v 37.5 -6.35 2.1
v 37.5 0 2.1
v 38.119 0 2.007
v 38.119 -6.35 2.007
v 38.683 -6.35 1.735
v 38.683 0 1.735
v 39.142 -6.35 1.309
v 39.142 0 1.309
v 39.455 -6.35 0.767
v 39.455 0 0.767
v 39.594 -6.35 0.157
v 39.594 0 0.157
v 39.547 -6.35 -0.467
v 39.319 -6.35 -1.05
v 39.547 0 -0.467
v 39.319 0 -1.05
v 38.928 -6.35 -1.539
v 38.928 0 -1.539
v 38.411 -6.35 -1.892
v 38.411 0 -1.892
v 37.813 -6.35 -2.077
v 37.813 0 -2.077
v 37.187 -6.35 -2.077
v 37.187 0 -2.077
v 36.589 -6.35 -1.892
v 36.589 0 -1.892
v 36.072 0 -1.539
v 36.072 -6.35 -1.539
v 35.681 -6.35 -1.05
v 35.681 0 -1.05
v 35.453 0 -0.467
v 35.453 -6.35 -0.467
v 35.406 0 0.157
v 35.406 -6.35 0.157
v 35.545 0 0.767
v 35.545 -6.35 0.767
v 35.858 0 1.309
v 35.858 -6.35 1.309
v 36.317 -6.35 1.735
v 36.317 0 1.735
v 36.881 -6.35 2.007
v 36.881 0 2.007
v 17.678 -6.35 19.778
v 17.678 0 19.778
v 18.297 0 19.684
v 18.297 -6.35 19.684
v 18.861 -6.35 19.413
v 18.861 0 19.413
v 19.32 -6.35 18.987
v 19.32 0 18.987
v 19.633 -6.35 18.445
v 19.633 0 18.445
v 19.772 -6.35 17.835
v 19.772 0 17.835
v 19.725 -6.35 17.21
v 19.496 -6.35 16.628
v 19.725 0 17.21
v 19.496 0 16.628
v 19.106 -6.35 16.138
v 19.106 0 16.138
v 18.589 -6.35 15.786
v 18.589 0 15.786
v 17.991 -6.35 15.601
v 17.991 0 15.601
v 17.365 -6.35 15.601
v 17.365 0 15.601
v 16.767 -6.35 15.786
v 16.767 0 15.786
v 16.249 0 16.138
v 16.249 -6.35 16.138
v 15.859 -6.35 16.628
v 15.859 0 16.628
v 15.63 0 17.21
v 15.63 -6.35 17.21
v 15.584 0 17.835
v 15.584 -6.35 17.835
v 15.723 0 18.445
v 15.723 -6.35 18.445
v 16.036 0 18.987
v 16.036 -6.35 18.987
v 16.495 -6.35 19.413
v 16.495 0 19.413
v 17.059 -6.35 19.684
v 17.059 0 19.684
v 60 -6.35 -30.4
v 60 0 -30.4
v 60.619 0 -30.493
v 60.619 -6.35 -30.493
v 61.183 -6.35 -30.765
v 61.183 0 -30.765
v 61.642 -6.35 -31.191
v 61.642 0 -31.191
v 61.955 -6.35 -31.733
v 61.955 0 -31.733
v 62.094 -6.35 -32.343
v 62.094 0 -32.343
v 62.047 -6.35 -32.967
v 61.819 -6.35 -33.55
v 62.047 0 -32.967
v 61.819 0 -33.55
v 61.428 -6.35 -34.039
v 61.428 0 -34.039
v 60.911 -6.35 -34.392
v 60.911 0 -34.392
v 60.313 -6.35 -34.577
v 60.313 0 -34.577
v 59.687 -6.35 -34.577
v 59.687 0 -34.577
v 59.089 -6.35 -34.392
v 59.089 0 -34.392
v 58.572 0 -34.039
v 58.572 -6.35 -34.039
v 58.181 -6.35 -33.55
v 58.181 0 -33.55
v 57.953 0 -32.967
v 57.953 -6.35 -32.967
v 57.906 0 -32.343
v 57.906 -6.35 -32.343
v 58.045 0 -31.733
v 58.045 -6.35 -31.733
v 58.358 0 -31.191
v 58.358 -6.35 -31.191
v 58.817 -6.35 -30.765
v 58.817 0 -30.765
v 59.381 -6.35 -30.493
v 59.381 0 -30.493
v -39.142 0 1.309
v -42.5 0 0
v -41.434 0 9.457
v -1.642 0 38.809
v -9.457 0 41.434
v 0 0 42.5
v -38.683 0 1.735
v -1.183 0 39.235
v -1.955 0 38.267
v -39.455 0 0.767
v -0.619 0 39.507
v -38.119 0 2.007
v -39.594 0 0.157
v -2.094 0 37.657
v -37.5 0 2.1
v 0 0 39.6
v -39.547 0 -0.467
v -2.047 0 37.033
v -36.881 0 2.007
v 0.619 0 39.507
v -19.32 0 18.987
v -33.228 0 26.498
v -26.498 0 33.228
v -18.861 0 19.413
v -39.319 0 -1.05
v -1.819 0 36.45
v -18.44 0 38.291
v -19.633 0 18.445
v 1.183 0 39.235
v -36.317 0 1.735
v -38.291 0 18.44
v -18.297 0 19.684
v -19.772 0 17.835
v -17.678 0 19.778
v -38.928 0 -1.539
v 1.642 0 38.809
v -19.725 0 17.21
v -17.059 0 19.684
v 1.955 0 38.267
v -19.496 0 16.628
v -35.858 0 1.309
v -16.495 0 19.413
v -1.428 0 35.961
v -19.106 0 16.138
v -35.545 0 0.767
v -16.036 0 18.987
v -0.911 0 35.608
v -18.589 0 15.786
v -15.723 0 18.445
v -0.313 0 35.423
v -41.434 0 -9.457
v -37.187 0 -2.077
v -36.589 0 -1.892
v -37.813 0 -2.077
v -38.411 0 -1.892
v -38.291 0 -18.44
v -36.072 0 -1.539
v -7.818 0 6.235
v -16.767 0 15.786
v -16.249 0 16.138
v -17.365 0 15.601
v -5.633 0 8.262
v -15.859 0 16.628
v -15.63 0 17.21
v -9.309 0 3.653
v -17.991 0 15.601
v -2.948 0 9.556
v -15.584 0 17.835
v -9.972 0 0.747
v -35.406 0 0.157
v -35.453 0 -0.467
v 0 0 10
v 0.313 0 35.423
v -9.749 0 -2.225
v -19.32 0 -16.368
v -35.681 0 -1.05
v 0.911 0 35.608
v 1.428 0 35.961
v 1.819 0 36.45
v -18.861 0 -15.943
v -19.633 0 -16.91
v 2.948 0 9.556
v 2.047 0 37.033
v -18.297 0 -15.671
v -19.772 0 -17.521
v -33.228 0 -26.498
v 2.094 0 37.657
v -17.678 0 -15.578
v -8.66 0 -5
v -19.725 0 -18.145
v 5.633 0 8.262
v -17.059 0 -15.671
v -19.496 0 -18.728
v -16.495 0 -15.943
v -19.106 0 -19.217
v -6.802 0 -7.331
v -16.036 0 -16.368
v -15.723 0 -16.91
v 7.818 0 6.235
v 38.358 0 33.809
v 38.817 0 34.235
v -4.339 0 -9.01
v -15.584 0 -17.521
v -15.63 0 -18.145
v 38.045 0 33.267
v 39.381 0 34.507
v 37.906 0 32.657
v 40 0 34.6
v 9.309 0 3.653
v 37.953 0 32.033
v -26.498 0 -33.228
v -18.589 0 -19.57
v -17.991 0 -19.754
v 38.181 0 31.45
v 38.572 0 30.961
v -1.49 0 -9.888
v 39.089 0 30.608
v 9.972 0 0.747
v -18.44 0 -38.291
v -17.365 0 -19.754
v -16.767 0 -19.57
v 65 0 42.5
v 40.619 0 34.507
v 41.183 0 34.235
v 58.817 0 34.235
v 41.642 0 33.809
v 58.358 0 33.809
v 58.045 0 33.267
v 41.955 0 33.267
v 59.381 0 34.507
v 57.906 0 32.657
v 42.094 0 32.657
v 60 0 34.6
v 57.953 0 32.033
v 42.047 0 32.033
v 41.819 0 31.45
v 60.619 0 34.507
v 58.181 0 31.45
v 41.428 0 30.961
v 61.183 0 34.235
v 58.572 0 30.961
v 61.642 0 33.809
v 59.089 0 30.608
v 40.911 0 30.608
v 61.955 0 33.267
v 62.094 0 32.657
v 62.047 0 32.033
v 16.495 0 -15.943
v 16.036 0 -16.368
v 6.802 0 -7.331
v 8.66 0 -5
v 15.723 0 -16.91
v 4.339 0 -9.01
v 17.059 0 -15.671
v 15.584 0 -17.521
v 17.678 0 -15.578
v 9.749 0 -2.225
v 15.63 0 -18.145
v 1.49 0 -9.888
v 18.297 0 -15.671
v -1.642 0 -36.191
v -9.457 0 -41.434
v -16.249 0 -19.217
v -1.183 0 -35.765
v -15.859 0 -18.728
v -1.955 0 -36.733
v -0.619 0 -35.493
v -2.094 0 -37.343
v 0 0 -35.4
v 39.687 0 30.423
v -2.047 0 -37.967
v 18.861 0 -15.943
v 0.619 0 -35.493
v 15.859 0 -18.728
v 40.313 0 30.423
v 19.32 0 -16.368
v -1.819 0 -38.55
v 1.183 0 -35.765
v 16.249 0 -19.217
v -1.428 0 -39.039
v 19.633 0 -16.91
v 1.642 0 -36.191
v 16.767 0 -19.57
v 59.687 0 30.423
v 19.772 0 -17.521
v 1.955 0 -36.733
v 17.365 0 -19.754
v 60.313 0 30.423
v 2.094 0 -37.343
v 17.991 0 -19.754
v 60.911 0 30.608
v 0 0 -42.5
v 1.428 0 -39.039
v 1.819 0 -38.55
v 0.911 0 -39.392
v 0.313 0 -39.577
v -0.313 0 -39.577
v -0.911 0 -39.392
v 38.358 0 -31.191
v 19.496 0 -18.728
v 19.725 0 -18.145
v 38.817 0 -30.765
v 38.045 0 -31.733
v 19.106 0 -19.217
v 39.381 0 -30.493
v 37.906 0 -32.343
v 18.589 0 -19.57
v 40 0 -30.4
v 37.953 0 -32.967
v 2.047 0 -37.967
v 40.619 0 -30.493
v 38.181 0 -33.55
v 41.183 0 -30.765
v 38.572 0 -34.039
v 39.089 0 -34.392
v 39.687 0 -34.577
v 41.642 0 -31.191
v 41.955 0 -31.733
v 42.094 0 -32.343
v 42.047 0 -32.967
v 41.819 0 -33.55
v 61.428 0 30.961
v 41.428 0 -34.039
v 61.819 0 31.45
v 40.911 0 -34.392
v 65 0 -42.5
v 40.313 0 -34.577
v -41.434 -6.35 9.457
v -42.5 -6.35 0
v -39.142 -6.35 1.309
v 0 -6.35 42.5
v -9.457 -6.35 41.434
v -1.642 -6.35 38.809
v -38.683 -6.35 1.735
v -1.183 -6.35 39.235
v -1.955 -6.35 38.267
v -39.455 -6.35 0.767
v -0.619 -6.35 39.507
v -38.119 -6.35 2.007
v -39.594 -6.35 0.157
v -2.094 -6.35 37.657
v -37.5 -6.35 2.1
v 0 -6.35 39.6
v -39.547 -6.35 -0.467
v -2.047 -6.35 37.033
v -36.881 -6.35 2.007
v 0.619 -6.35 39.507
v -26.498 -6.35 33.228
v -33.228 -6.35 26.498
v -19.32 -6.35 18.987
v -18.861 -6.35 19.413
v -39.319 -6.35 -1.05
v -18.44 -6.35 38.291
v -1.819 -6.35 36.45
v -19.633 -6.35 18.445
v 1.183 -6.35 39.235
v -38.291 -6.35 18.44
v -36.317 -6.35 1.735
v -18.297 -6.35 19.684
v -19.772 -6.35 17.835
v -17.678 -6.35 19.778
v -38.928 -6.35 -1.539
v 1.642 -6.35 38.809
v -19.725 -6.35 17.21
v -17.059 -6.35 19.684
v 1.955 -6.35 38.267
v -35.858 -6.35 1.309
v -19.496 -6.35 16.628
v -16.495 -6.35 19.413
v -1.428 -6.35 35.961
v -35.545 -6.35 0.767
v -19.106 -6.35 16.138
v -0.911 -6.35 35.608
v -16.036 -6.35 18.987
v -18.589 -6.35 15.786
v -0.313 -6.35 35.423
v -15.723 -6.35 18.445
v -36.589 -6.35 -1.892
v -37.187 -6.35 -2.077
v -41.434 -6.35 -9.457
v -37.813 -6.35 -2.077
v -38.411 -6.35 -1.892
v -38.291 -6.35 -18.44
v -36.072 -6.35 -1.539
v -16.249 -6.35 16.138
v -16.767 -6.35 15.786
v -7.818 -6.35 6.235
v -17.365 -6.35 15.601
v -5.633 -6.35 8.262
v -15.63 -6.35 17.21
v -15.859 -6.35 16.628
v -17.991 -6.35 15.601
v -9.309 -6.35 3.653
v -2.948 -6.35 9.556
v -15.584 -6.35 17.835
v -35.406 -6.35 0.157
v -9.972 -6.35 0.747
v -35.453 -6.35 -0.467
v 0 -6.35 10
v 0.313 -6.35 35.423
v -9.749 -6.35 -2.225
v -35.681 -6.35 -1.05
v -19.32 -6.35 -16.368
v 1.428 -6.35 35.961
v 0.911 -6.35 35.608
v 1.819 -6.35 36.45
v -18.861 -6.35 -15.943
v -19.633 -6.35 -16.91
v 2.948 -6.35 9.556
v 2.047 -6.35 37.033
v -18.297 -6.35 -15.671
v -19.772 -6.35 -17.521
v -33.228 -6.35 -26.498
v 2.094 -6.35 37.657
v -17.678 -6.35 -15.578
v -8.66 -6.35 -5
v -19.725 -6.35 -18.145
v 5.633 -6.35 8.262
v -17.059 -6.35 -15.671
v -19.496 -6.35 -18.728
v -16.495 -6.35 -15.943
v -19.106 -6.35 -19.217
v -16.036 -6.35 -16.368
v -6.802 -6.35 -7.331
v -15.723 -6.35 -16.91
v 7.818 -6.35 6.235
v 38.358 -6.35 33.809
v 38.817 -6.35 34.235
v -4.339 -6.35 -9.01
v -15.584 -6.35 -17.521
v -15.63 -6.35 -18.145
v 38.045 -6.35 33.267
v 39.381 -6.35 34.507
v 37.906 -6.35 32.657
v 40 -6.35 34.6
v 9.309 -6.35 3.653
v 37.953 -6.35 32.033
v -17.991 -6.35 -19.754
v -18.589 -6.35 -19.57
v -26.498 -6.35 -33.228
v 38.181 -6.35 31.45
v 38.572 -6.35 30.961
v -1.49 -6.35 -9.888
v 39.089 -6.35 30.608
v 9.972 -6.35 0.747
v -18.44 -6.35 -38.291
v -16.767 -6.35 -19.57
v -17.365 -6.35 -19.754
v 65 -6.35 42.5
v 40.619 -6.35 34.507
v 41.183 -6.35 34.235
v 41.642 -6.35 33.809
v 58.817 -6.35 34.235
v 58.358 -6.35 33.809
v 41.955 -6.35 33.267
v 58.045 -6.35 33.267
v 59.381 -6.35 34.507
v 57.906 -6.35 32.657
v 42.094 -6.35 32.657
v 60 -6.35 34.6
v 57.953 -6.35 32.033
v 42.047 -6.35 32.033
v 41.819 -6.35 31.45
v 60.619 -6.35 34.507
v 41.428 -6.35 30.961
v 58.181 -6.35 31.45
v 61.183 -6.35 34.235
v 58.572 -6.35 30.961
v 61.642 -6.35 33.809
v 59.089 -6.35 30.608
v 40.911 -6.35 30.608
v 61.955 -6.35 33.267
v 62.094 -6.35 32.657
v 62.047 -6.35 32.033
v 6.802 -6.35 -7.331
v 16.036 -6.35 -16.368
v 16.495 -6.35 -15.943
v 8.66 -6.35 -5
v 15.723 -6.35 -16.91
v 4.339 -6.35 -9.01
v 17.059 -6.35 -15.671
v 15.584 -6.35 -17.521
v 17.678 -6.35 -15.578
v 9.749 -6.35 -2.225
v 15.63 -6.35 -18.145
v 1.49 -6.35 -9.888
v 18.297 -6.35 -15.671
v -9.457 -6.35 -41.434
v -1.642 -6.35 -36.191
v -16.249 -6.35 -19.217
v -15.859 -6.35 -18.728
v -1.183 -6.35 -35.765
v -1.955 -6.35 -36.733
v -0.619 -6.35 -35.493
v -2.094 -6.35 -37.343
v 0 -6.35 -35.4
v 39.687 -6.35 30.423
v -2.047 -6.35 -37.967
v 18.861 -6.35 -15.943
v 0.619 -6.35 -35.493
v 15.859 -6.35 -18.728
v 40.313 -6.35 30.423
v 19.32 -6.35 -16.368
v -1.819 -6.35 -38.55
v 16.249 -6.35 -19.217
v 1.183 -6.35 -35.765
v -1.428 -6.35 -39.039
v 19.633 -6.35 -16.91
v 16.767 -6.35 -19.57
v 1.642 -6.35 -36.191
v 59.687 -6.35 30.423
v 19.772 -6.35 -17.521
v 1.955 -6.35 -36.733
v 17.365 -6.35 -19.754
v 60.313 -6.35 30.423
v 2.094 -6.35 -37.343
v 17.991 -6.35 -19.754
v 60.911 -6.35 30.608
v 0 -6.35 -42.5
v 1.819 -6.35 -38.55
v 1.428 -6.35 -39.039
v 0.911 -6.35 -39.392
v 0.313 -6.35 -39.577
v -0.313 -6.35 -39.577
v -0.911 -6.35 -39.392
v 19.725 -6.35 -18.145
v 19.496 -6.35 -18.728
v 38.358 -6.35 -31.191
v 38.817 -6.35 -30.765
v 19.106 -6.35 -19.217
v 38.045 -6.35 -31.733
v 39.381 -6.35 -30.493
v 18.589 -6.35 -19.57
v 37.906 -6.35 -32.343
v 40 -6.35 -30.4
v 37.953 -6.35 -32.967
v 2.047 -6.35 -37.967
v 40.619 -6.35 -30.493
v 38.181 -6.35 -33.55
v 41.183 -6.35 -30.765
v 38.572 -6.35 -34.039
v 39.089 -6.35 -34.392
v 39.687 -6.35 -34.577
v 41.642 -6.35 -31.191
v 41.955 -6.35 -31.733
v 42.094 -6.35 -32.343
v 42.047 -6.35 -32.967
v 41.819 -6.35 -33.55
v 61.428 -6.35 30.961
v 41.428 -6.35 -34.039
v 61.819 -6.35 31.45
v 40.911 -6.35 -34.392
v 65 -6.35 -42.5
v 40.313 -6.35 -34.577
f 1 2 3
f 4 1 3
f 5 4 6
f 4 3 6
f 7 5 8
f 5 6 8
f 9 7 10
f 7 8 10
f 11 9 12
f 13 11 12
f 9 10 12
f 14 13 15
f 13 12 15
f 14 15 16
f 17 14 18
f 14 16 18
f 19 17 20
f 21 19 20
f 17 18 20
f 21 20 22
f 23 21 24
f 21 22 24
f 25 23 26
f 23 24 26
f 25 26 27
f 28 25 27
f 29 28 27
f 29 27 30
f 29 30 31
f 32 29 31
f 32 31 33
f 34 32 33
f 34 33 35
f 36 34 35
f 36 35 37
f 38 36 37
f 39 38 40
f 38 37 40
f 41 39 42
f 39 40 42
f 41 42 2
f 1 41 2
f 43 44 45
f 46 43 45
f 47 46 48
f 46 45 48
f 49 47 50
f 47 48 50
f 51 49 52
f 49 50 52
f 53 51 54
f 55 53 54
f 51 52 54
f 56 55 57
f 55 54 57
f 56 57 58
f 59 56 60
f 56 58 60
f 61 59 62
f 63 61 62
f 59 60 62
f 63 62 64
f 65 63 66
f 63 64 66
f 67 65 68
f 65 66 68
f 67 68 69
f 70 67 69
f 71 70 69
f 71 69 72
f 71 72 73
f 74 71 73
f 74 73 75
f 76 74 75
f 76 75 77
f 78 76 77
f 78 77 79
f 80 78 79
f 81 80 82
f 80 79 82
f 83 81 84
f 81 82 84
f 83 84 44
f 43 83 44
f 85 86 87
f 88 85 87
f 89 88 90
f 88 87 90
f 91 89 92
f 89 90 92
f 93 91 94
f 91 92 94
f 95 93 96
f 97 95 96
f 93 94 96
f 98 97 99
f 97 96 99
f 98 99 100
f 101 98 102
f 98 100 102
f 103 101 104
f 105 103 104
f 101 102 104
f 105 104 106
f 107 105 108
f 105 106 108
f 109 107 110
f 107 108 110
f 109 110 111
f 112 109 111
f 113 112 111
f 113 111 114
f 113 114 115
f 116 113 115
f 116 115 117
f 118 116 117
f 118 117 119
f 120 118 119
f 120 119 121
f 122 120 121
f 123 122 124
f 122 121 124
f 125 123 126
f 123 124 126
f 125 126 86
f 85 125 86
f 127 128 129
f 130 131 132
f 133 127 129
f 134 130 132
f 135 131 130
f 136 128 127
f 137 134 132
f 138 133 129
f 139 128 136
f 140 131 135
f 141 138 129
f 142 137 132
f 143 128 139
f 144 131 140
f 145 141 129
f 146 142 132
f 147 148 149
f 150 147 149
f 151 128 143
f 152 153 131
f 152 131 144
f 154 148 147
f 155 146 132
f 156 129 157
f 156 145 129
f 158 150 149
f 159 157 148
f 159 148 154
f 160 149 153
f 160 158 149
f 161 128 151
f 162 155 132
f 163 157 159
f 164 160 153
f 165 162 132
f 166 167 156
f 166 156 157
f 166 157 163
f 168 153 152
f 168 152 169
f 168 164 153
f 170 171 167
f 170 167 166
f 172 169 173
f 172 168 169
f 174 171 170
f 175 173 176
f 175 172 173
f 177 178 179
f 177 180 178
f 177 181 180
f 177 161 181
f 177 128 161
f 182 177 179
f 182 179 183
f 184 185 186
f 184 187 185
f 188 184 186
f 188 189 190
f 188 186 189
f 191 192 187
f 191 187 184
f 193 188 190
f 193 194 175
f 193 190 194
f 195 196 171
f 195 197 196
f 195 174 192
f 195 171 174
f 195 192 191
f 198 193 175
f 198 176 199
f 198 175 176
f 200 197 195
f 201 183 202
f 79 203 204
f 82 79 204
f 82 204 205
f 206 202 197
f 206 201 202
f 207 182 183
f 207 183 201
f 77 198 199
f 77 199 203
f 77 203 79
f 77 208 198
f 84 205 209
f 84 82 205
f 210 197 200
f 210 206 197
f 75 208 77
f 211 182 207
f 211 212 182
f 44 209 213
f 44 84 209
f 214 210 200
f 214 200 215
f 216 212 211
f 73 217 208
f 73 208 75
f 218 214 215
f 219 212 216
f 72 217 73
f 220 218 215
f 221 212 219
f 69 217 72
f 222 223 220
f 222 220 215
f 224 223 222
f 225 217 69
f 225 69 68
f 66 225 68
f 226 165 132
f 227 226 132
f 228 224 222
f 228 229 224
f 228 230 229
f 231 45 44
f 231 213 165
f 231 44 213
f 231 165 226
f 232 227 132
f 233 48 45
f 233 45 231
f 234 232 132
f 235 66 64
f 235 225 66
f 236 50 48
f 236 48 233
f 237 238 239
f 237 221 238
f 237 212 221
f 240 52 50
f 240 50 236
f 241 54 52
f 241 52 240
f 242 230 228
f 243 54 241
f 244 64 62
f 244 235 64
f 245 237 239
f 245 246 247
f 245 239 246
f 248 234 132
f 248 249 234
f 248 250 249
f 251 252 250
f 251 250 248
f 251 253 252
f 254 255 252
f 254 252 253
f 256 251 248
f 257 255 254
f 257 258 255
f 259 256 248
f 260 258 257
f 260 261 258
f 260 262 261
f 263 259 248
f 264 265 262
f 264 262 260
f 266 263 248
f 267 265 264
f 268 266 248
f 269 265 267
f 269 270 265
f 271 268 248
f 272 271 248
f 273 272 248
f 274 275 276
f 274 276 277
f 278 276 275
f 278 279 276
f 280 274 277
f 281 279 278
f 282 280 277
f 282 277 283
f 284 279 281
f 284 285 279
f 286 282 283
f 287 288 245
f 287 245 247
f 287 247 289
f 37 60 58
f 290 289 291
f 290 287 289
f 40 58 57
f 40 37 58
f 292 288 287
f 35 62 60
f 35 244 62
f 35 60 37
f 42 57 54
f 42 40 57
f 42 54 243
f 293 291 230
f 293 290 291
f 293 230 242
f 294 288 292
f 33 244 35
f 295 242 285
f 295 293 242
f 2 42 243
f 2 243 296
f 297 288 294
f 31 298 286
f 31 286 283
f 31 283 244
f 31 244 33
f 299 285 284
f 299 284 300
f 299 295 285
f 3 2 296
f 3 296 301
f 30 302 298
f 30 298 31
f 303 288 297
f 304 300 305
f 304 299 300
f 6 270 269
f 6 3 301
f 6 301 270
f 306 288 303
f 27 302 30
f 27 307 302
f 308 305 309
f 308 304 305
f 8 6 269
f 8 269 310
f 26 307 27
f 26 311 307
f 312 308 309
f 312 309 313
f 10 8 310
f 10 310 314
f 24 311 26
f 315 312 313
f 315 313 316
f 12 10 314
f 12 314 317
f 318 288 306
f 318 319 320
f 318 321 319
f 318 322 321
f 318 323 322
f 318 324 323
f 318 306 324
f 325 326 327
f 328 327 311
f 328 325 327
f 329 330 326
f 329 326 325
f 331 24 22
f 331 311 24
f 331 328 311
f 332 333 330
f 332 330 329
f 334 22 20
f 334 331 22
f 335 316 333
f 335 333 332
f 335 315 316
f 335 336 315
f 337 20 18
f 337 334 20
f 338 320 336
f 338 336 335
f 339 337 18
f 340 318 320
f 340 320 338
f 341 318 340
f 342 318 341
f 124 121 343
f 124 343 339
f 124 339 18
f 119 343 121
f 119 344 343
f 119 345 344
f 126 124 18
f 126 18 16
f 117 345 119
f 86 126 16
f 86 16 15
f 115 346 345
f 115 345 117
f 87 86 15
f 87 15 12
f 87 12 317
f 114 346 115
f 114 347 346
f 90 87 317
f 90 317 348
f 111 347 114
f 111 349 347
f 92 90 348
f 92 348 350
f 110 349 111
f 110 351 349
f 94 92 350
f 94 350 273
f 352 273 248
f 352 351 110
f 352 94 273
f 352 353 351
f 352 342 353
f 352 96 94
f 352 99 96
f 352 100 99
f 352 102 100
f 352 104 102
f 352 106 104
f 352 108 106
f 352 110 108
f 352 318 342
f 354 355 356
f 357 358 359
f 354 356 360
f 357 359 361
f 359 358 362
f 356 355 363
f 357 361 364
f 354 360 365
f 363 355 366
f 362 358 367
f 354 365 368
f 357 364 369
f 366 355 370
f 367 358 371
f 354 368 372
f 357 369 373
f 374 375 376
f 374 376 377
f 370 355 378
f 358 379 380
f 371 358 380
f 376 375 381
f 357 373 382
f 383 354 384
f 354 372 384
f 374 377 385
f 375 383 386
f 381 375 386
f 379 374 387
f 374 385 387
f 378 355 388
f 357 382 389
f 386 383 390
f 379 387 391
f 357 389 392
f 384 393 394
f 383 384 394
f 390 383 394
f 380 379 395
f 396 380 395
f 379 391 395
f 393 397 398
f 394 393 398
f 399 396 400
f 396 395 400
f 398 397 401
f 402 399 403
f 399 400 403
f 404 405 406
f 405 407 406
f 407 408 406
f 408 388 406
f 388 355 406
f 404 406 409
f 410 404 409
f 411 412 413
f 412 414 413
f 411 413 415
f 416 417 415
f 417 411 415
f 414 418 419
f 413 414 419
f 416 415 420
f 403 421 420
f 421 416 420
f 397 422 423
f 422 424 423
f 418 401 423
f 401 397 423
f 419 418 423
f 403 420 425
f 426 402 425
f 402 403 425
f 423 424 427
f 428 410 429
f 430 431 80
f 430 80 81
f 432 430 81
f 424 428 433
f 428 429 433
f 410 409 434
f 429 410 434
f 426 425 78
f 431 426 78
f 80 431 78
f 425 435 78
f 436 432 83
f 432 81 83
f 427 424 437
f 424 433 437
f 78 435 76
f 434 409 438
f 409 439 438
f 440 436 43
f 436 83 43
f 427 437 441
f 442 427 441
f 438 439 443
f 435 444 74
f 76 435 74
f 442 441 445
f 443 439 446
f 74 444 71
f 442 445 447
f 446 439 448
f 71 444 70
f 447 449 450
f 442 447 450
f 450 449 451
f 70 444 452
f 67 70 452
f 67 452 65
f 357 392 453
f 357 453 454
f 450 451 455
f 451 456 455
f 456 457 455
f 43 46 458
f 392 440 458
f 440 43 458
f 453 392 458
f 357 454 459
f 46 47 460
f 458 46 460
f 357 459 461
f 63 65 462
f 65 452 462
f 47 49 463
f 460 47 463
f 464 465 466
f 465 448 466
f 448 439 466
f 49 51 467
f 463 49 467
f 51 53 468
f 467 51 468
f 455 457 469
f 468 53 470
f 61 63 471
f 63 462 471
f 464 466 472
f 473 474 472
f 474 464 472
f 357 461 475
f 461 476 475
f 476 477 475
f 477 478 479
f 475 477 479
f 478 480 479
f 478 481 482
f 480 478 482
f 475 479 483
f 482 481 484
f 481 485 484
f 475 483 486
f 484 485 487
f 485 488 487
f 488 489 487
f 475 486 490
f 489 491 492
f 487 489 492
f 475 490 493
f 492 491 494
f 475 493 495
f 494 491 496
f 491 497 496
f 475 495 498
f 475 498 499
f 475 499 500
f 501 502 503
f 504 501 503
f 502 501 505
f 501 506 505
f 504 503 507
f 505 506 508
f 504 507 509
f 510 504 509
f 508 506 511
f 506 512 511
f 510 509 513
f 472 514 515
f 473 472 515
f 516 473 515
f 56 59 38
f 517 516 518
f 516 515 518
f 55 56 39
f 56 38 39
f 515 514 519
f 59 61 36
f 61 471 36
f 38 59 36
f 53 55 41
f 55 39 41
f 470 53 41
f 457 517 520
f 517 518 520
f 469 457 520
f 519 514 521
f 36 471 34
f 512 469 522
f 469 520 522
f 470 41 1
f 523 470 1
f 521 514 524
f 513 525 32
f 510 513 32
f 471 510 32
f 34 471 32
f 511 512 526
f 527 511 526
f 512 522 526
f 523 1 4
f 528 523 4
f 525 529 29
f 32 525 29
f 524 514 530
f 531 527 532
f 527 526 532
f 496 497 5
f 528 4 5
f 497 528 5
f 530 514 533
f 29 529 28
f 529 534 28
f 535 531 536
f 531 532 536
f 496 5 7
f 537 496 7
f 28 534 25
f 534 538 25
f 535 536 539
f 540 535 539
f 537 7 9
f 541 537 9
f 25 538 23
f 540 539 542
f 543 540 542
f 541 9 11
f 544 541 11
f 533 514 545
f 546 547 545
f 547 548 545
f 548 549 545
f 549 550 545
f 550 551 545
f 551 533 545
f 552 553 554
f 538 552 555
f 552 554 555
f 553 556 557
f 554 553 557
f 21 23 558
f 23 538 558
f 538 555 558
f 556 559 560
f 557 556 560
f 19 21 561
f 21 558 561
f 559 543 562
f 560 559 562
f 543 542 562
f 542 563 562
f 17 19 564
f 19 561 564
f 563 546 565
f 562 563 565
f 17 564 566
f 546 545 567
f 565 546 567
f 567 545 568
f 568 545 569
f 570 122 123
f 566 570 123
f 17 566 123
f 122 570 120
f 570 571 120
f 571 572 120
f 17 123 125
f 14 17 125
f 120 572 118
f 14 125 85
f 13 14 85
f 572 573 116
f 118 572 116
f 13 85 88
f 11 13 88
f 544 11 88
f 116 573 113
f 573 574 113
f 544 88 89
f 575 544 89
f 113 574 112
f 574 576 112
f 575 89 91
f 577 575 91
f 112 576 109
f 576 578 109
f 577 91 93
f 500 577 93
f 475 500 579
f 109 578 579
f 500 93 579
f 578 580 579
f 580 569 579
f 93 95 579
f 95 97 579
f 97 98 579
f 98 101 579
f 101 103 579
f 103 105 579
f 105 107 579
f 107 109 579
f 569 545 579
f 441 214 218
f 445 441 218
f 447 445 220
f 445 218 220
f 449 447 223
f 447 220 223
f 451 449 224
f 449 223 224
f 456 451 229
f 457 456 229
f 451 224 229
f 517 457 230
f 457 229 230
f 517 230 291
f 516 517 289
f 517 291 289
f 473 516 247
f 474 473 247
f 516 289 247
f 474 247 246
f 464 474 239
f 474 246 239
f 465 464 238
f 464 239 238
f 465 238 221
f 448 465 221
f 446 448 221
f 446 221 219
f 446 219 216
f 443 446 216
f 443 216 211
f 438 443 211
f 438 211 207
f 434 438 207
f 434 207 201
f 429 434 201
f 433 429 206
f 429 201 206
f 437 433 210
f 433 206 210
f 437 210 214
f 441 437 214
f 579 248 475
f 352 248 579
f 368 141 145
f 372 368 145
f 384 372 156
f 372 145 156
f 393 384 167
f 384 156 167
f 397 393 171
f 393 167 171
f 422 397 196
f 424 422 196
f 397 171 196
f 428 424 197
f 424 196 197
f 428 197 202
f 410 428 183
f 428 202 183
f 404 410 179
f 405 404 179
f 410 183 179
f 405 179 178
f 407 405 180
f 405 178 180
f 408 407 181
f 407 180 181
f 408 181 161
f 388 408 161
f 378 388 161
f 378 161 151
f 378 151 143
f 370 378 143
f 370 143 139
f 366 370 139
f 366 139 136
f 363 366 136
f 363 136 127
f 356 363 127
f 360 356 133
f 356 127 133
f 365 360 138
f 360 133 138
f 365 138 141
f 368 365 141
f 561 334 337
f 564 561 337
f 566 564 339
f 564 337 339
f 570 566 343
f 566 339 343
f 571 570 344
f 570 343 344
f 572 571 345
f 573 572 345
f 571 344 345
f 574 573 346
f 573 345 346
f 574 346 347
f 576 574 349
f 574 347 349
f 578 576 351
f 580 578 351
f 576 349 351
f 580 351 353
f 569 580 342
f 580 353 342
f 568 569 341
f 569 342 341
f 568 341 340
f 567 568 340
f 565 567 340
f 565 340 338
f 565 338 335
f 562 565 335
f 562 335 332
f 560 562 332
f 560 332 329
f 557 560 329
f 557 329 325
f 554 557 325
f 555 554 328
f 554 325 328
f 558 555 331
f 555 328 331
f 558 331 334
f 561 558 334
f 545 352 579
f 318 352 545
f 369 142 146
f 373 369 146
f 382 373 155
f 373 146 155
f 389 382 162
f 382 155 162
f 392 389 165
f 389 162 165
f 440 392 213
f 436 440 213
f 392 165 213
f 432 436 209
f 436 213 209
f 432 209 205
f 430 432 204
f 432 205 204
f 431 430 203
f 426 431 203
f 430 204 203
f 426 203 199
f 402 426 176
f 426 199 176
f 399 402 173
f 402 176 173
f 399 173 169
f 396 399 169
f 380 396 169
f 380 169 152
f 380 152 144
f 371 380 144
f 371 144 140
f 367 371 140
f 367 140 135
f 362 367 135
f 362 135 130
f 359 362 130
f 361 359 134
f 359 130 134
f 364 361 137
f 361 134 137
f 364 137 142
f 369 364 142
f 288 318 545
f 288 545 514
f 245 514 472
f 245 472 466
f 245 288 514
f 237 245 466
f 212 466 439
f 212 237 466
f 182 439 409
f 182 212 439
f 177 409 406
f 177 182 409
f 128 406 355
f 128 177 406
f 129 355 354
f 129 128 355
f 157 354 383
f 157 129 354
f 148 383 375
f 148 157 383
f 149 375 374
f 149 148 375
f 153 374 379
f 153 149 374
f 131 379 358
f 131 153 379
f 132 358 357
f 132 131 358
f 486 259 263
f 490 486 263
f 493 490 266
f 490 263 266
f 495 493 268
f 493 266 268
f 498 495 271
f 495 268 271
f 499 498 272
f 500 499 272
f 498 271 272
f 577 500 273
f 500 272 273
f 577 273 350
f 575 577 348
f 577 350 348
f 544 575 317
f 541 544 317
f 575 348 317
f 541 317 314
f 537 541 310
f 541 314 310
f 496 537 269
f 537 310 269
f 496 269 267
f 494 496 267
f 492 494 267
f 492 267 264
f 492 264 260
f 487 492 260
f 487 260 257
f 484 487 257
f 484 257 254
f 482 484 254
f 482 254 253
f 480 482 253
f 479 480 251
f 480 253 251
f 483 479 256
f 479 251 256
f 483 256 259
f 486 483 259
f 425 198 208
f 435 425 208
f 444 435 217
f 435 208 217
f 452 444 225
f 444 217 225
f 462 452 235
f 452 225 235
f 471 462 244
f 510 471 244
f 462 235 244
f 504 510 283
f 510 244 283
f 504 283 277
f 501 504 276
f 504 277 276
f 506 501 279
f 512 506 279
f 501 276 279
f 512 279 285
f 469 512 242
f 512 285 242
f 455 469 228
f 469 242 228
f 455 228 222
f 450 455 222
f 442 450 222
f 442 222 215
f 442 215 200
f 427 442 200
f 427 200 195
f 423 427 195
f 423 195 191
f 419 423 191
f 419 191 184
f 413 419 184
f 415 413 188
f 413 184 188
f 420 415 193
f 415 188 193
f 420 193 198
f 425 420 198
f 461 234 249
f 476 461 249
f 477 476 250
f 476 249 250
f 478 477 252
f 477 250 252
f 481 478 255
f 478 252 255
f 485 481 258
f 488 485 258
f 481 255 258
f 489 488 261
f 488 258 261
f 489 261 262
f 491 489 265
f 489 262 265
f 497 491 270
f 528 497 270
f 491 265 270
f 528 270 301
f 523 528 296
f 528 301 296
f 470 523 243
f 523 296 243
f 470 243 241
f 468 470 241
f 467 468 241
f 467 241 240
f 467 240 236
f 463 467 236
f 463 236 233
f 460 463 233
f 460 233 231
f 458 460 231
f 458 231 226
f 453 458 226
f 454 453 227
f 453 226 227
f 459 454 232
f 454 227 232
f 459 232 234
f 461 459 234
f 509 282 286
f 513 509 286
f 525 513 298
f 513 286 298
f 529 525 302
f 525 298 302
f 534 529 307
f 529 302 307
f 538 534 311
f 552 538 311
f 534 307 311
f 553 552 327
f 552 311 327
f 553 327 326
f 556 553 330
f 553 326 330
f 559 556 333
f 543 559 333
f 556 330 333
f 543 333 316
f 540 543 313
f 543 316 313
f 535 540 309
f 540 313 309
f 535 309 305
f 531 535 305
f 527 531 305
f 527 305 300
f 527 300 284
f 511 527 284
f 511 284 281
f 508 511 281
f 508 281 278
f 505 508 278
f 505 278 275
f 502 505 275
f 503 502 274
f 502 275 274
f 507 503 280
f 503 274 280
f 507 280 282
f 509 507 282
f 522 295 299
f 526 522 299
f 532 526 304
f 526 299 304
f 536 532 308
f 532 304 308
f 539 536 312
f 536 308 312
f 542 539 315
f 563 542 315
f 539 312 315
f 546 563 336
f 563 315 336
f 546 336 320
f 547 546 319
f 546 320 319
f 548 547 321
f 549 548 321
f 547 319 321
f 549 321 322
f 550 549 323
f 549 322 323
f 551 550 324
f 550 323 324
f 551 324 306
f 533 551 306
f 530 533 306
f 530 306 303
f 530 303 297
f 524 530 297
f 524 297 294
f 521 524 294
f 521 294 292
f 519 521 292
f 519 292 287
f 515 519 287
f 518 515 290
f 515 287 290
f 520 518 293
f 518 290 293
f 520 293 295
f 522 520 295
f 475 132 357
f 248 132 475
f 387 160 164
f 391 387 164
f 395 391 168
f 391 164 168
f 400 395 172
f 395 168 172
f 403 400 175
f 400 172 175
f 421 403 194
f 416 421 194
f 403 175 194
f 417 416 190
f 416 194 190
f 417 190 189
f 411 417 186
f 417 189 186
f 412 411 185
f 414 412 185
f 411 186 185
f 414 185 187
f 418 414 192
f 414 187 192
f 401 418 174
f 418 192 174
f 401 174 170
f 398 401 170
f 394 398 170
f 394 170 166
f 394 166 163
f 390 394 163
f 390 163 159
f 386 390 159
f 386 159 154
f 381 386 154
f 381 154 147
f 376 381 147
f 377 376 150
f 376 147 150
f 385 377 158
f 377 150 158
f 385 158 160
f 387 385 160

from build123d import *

# Parameters (mm, degrees)
SKETCH1_R           = 2.1
SKETCH1_R_2         = 10
BOSS_EXTRUDE1_DEPTH = 6.35


with BuildPart() as part:
    # Sketch1 → Boss-Extrude1 (new body)
    with BuildSketch(Plane(origin=(0, 0, 0), x_dir=(1, 0, 0), z_dir=(0, 1, 0))):
        with BuildLine():
            Line((65, 42.5), (0, 42.5))
            ThreePointArc((0, 42.5), (-42.5, 0), (0, -42.5))
            Line((0, -42.5), (65, -42.5))
            Line((65, -42.5), (65, 42.5))
        make_face()
        with Locations(Location((40, -32.5, 0), (0, 0, 270))):
            Circle(SKETCH1_R, mode=Mode.SUBTRACT)
        with Locations(Location((60, -32.5, 0), (0, 0, 270))):
            Circle(SKETCH1_R, mode=Mode.SUBTRACT)
        with Locations(Location((40, 32.5, 0), (0, 0, 270))):
            Circle(SKETCH1_R, mode=Mode.SUBTRACT)
        with Locations(Location((60, 32.5, 0), (0, 0, 270))):
            Circle(SKETCH1_R, mode=Mode.SUBTRACT)
        with Locations(Location((37.5, 0, 0), (0, 0, 270))):
            Circle(SKETCH1_R, mode=Mode.SUBTRACT)
        with Locations(Location((17.67766953, 17.67766953, 0), (0, 0, 270))):
            Circle(SKETCH1_R, mode=Mode.SUBTRACT)
        with Locations(Location((0, -37.5, 0), (0, 0, 270))):
            Circle(SKETCH1_R, mode=Mode.SUBTRACT)
        with Locations(Location((-17.67766953, -17.67766953, 0), (0, 0, 270))):
            Circle(SKETCH1_R, mode=Mode.SUBTRACT)
        with Locations(Location((17.67766953, -17.67766953, 0), (0, 0, 270))):
            Circle(SKETCH1_R, mode=Mode.SUBTRACT)
        with Locations(Location((-37.5, 0, 0), (0, 0, 270))):
            Circle(SKETCH1_R, mode=Mode.SUBTRACT)
        with Locations(Location((-17.67766953, 17.67766953, 0), (0, 0, 270))):
            Circle(SKETCH1_R, mode=Mode.SUBTRACT)
        with Locations(Location((0, 0, 0), (0, 0, 270))):
            Circle(SKETCH1_R_2, mode=Mode.SUBTRACT)
        with Locations(Location((0, 37.5, 0), (0, 0, 270))):
            Circle(SKETCH1_R, mode=Mode.SUBTRACT)
    extrude(amount=-BOSS_EXTRUDE1_DEPTH)


solid = part.part
